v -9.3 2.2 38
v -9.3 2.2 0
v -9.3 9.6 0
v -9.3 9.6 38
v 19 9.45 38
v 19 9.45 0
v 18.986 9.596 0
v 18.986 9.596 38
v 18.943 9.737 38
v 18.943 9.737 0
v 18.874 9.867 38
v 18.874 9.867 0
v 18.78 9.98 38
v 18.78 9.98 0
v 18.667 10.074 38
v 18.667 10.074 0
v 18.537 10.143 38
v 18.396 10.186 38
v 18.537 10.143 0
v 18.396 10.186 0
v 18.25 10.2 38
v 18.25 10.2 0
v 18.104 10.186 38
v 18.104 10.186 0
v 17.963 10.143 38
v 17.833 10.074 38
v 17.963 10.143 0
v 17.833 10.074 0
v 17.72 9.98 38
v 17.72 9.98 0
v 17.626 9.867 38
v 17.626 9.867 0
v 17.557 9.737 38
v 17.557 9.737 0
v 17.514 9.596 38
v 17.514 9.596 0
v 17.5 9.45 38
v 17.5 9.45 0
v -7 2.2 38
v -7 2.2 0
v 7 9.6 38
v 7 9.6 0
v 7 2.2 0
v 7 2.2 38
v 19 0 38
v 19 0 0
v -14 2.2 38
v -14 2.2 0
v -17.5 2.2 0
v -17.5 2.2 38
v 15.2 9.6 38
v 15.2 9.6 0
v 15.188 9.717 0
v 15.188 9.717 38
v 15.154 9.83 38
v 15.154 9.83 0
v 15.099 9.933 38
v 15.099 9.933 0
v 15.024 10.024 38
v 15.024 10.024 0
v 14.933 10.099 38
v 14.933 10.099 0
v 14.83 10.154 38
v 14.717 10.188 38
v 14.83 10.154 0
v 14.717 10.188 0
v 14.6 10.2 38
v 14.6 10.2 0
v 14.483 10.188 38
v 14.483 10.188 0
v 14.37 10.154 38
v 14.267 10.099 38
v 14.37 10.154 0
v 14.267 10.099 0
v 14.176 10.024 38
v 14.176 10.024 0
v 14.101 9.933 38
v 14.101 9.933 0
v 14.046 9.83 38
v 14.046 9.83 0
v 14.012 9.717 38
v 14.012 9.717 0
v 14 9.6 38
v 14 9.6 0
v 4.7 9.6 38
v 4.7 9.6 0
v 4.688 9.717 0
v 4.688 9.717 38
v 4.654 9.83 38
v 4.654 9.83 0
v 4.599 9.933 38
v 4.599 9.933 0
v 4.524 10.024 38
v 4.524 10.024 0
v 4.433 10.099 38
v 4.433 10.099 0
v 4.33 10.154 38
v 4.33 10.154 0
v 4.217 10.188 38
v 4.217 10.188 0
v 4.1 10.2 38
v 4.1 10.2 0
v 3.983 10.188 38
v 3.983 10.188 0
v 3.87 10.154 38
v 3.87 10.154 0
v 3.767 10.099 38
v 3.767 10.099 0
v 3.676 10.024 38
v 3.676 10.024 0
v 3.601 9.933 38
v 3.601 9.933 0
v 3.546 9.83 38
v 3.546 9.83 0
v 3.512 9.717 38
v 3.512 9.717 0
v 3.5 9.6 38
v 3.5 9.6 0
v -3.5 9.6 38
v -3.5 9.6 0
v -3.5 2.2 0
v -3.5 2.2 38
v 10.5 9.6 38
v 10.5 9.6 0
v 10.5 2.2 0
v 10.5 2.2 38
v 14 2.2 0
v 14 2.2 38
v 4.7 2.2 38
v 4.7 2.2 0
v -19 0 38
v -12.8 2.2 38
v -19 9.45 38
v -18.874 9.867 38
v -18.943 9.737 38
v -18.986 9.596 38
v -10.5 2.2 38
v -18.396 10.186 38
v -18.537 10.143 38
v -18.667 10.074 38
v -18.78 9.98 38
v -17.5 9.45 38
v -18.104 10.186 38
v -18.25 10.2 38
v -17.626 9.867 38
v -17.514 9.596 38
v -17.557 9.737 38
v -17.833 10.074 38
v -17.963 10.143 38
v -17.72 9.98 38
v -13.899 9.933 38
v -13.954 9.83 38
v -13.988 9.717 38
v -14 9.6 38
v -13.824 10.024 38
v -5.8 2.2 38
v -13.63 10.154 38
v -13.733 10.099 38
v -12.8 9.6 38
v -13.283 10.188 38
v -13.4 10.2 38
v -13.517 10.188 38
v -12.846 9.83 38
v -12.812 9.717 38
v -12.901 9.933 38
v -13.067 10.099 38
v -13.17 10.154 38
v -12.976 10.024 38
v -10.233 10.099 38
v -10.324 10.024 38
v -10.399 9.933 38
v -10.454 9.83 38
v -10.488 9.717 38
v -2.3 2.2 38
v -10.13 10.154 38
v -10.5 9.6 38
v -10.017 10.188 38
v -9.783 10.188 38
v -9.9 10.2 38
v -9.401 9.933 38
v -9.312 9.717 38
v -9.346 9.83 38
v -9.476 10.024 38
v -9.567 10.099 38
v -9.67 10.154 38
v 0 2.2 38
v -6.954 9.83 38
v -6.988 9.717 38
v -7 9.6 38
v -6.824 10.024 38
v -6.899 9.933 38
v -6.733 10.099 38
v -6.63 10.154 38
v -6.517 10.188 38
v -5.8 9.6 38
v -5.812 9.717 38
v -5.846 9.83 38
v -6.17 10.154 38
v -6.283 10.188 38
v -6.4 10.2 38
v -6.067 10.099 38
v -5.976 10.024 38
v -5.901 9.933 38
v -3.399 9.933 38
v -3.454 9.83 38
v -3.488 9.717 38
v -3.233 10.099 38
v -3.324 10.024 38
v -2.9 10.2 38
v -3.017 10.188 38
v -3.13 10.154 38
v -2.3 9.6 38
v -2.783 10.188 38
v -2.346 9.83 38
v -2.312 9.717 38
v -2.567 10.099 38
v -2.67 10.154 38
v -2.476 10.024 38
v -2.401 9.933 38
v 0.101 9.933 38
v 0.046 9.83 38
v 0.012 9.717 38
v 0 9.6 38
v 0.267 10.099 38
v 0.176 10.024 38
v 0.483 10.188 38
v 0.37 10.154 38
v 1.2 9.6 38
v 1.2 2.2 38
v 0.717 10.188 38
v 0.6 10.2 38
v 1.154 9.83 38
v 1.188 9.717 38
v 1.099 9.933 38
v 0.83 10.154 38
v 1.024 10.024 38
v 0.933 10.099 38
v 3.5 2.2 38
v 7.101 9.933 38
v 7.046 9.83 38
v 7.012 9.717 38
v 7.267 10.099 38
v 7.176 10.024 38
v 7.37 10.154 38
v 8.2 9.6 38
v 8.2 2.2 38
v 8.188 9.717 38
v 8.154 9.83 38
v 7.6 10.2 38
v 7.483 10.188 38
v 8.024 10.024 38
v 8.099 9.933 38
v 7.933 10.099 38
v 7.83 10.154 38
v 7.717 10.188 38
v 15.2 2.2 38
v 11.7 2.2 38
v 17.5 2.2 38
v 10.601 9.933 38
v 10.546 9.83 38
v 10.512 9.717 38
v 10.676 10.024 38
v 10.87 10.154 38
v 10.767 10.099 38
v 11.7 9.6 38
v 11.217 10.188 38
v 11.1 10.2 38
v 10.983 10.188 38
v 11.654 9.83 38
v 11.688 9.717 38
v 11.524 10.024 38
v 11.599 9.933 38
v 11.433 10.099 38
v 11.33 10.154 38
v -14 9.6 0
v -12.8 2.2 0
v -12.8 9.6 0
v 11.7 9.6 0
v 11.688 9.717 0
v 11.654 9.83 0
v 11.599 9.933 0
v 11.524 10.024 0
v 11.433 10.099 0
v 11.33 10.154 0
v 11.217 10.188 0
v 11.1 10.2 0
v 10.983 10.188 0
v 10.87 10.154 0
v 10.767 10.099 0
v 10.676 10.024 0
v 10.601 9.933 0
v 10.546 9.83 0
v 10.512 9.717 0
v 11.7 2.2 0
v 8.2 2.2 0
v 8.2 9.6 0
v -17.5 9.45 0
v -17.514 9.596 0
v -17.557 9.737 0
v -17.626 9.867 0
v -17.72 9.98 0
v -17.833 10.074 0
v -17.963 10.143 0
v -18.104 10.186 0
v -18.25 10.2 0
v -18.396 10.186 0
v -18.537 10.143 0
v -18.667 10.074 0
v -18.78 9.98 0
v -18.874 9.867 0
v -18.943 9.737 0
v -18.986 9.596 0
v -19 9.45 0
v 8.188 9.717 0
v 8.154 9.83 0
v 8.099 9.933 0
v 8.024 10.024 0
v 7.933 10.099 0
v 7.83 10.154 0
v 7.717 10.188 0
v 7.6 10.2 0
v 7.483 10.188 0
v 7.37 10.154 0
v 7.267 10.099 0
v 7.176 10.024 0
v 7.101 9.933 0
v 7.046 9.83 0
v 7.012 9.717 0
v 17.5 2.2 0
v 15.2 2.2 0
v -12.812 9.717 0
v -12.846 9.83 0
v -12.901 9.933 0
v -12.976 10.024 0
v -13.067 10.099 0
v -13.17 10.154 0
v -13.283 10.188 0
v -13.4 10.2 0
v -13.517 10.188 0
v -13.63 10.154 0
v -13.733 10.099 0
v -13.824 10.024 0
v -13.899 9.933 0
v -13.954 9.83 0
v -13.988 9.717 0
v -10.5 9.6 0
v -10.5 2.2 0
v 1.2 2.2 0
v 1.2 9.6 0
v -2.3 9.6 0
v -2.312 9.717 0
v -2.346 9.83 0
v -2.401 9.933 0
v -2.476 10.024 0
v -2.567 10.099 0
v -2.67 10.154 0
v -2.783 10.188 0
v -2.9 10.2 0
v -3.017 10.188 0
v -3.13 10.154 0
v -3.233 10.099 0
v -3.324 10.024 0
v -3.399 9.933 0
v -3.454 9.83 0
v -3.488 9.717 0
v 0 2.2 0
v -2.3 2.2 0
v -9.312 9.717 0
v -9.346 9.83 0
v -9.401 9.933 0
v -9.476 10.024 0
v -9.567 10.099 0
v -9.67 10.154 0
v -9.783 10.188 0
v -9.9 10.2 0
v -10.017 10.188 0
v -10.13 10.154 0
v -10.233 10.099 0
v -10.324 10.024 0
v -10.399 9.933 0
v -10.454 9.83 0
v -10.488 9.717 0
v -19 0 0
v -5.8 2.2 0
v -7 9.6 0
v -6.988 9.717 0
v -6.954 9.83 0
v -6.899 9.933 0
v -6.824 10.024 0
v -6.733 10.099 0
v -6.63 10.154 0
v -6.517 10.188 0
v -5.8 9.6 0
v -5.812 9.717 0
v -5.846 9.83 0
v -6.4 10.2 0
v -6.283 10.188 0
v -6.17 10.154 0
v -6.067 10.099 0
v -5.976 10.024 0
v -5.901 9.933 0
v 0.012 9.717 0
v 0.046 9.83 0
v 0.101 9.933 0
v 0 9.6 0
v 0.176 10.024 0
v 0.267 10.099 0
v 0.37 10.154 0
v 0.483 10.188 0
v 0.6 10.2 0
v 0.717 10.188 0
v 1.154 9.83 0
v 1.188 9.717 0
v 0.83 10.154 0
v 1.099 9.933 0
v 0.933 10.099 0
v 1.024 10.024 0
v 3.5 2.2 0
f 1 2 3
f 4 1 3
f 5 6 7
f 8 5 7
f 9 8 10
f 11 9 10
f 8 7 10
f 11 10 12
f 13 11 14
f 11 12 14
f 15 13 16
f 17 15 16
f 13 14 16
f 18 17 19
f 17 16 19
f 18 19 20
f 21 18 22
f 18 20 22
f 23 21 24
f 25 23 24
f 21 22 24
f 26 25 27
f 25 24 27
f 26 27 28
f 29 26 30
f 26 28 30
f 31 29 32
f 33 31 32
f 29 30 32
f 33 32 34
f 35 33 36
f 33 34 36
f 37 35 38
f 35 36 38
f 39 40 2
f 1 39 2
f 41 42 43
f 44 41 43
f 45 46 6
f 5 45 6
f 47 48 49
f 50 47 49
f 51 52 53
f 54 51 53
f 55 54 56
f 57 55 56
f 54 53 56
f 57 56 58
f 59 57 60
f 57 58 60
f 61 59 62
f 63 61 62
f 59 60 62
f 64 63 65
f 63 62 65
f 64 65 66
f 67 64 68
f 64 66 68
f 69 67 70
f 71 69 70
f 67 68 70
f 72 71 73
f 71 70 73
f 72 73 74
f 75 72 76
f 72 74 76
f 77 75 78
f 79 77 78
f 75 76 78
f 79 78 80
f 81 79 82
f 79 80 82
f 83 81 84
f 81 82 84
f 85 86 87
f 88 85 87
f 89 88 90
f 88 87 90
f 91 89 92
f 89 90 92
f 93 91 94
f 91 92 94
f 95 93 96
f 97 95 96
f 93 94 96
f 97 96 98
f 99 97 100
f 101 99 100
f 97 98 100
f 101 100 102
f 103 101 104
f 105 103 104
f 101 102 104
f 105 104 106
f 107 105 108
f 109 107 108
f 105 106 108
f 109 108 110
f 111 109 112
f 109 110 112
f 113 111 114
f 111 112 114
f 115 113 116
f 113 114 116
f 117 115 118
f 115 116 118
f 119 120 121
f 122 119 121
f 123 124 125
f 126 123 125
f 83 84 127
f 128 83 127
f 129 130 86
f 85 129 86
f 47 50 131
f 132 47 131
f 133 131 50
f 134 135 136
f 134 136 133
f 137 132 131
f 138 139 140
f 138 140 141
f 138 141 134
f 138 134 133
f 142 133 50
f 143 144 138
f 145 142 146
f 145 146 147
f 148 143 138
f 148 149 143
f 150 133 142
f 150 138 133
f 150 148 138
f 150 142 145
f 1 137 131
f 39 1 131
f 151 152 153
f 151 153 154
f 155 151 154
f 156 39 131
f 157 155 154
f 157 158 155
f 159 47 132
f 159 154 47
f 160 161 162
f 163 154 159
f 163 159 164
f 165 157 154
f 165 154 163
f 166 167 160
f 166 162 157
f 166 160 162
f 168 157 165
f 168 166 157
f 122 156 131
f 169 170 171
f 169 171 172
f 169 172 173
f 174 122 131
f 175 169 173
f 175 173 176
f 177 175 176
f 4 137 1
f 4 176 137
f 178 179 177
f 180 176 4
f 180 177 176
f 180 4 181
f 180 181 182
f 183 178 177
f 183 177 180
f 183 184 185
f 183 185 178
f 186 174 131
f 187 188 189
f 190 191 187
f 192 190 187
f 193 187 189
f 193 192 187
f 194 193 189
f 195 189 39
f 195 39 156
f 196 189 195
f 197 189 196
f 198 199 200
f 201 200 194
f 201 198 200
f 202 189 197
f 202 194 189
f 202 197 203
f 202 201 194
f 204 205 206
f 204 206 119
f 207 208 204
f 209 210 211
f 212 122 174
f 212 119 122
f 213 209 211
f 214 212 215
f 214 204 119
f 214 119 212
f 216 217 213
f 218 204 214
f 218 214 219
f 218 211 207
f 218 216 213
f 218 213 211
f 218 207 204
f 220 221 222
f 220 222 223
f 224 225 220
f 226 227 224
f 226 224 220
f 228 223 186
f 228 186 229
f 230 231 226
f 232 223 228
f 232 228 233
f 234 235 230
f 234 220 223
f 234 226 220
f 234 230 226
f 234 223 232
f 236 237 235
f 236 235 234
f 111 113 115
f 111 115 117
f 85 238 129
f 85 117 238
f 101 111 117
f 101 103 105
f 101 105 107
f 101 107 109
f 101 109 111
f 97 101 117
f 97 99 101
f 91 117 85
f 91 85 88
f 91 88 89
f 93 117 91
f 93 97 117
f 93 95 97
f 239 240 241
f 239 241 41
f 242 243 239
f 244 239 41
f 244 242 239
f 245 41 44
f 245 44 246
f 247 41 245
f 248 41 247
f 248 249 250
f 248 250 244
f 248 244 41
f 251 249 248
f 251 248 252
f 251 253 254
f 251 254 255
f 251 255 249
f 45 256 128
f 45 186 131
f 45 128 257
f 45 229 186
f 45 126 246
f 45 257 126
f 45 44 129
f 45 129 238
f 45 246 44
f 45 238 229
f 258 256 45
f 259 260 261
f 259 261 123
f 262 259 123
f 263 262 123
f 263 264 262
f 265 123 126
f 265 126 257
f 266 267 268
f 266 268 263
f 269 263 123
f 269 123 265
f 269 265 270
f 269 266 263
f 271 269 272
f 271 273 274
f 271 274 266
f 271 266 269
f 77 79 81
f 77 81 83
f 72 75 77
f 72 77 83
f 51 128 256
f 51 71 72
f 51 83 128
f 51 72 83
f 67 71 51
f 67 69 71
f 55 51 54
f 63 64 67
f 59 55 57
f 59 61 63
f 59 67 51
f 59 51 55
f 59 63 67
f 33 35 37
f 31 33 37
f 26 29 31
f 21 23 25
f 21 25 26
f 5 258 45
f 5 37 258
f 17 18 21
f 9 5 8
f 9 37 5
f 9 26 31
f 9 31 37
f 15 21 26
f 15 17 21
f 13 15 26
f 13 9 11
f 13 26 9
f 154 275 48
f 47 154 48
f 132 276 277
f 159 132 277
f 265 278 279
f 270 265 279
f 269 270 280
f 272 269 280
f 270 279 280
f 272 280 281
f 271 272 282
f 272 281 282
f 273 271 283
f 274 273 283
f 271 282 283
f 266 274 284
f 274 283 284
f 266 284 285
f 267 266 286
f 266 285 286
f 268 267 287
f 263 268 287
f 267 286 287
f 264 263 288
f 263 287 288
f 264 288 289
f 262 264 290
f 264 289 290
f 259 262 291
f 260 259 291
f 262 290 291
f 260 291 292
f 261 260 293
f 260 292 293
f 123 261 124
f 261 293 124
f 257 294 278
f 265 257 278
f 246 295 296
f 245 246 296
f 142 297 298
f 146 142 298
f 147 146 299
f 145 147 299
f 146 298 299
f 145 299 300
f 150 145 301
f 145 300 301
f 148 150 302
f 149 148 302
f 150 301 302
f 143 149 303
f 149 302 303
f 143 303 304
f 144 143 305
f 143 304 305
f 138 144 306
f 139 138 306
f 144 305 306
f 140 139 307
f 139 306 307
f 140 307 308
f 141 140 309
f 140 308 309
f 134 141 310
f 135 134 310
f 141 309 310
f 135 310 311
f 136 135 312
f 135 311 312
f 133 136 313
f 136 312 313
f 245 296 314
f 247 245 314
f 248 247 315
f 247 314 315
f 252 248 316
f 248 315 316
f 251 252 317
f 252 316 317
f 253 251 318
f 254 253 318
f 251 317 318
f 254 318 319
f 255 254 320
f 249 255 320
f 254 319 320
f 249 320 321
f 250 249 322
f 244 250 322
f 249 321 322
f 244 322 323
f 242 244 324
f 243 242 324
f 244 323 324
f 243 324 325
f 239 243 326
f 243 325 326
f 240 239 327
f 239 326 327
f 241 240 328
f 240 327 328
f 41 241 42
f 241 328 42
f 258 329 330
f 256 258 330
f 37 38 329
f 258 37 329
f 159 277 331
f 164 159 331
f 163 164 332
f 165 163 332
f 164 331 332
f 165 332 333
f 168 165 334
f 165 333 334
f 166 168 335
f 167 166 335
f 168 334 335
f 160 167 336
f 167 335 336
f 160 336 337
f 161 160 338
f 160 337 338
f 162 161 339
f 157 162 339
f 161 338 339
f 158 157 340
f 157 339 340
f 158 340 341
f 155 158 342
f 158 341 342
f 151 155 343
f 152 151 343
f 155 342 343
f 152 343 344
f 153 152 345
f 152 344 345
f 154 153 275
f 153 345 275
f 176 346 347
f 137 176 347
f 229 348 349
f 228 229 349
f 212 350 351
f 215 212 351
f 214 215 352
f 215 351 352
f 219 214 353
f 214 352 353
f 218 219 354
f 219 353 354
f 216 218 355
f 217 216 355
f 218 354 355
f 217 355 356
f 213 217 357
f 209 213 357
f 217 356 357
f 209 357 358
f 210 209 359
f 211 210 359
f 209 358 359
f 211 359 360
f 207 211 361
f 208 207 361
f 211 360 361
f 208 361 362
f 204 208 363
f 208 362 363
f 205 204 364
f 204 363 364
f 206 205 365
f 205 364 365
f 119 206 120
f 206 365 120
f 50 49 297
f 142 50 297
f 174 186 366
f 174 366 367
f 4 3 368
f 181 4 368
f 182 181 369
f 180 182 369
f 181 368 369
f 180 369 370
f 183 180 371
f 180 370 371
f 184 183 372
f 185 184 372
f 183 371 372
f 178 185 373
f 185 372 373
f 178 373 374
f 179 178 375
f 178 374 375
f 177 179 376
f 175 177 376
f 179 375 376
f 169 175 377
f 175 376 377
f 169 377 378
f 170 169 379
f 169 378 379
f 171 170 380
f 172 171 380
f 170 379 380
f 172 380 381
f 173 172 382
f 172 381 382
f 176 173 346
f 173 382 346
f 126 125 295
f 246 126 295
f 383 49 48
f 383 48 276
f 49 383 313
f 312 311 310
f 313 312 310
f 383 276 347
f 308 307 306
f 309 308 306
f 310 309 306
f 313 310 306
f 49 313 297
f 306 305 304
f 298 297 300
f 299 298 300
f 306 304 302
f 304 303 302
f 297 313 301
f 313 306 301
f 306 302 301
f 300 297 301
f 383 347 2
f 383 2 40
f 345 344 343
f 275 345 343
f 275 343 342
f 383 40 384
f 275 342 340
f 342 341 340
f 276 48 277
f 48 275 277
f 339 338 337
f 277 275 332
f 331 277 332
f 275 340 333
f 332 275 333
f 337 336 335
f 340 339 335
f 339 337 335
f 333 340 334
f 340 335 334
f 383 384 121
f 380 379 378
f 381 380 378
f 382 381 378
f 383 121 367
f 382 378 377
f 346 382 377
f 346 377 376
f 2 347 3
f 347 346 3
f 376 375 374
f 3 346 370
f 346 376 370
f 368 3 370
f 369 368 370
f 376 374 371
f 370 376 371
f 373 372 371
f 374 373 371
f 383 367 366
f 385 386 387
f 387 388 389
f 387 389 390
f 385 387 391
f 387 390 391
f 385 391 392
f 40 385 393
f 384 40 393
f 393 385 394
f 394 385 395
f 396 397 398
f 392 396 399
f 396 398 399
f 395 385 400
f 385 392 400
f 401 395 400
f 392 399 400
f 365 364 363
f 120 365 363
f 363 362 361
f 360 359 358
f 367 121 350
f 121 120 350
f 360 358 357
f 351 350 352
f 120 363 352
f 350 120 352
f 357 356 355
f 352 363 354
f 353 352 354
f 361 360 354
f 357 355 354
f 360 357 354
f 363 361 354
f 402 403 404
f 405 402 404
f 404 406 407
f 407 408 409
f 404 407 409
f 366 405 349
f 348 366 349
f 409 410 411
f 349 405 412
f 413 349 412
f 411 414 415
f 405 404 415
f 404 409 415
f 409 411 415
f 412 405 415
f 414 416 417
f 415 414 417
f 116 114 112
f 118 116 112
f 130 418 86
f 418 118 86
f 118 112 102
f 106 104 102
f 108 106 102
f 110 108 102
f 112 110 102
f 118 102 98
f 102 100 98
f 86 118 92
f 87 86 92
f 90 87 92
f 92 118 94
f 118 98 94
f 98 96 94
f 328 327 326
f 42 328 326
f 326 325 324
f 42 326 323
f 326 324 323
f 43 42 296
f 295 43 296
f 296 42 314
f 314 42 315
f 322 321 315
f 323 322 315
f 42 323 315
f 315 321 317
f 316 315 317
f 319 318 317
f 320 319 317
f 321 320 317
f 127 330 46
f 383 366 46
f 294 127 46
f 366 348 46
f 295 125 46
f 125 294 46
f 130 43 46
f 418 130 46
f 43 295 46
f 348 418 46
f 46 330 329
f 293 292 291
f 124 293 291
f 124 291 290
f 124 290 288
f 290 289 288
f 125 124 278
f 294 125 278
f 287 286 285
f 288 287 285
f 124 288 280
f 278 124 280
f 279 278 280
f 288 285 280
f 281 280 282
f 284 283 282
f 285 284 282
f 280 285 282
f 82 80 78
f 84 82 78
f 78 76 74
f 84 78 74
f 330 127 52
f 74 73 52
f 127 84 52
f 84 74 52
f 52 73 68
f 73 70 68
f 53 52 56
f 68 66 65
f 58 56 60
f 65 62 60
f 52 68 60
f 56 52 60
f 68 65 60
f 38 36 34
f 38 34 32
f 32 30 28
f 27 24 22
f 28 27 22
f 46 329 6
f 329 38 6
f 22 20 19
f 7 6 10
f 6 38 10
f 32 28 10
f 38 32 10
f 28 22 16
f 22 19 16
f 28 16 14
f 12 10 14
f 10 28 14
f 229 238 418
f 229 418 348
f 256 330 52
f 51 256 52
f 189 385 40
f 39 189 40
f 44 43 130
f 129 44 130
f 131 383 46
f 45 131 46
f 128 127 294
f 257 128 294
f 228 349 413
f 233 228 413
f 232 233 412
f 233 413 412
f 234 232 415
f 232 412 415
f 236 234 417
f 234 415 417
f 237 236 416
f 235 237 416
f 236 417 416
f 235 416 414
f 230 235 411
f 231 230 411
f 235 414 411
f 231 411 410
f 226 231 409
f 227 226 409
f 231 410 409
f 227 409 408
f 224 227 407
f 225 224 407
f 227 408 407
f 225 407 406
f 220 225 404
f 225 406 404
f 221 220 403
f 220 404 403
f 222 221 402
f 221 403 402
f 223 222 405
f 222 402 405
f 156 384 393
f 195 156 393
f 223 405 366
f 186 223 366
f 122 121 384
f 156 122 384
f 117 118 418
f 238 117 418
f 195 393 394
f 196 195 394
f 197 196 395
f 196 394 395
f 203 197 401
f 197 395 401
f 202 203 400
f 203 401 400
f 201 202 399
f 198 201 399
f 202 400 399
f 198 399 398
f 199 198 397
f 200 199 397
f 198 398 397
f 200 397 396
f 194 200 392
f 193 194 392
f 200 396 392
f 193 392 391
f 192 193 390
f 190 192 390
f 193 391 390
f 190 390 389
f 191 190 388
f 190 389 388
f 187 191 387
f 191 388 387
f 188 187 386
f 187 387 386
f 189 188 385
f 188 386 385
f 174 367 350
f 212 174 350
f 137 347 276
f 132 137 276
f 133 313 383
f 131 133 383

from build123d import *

# Parameters (mm, degrees)
EXTRUDE1_DEPTH = 38


with BuildPart() as part:
    # Sketch1 → Extrude1 (new body)
    with BuildSketch(Plane.XY):
        with BuildLine():
            Line((-19, 0), (19, 0))
            Line((19, 0), (19, 2.2))
            Line((19, 2.2), (19, 9.45))
            ThreePointArc((19, 9.45), (18.25, 10.2), (17.5, 9.45))
            Line((17.5, 9.45), (17.5, 2.2))
            Line((17.5, 2.2), (15.2, 2.2))
            Line((15.2, 2.2), (15.2, 9.6))
            ThreePointArc((15.2, 9.6), (14.6, 10.2), (14, 9.6))
            Line((14, 9.6), (14, 2.2))
            Line((14, 2.2), (11.7, 2.2))
            Line((11.7, 2.2), (11.7, 9.6))
            ThreePointArc((11.7, 9.6), (11.1, 10.2), (10.5, 9.6))
            Line((10.5, 9.6), (10.5, 2.2))
            Line((10.5, 2.2), (8.2, 2.2))
            Line((8.2, 2.2), (8.2, 9.6))
            ThreePointArc((8.2, 9.6), (7.6, 10.2), (7, 9.6))
            Line((7, 9.6), (7, 2.2))
            Line((7, 2.2), (4.7, 2.2))
            Line((4.7, 2.2), (4.7, 9.6))
            ThreePointArc((4.7, 9.6), (4.1, 10.2), (3.5, 9.6))
            Line((3.5, 9.6), (3.5, 2.2))
            Line((3.5, 2.2), (1.2, 2.2))
            Line((1.2, 2.2), (1.2, 9.6))
            ThreePointArc((1.2, 9.6), (0.6, 10.2), (0, 9.6))
            Line((0, 9.6), (0, 2.2))
            Line((0, 2.2), (-2.3, 2.2))
            Line((-2.3, 2.2), (-2.3, 9.6))
            ThreePointArc((-2.3, 9.6), (-2.9, 10.2), (-3.5, 9.6))
            Line((-3.5, 9.6), (-3.5, 2.2))
            Line((-3.5, 2.2), (-5.8, 2.2))
            Line((-5.8, 2.2), (-5.8, 9.6))
            ThreePointArc((-5.8, 9.6), (-6.4, 10.2), (-7, 9.6))
            Line((-7, 9.6), (-7, 2.2))
            Line((-7, 2.2), (-9.3, 2.2))
            Line((-9.3, 2.2), (-9.3, 9.6))
            ThreePointArc((-9.3, 9.6), (-9.9, 10.2), (-10.5, 9.6))
            Line((-10.5, 9.6), (-10.5, 2.2))
            Line((-10.5, 2.2), (-12.8, 2.2))
            Line((-12.8, 2.2), (-12.8, 9.6))
            ThreePointArc((-12.8, 9.6), (-13.4, 10.2), (-14, 9.6))
            Line((-14, 9.6), (-14, 2.2))
            Line((-14, 2.2), (-17.5, 2.2))
            Line((-17.5, 2.2), (-17.5, 9.45))
            ThreePointArc((-17.5, 9.45), (-18.25, 10.2), (-19, 9.45))
            Line((-19, 9.45), (-19, 2.2))
            Line((-19, 2.2), (-19, 0))
        make_face()
    extrude(amount=EXTRUDE1_DEPTH)


solid = part.part
